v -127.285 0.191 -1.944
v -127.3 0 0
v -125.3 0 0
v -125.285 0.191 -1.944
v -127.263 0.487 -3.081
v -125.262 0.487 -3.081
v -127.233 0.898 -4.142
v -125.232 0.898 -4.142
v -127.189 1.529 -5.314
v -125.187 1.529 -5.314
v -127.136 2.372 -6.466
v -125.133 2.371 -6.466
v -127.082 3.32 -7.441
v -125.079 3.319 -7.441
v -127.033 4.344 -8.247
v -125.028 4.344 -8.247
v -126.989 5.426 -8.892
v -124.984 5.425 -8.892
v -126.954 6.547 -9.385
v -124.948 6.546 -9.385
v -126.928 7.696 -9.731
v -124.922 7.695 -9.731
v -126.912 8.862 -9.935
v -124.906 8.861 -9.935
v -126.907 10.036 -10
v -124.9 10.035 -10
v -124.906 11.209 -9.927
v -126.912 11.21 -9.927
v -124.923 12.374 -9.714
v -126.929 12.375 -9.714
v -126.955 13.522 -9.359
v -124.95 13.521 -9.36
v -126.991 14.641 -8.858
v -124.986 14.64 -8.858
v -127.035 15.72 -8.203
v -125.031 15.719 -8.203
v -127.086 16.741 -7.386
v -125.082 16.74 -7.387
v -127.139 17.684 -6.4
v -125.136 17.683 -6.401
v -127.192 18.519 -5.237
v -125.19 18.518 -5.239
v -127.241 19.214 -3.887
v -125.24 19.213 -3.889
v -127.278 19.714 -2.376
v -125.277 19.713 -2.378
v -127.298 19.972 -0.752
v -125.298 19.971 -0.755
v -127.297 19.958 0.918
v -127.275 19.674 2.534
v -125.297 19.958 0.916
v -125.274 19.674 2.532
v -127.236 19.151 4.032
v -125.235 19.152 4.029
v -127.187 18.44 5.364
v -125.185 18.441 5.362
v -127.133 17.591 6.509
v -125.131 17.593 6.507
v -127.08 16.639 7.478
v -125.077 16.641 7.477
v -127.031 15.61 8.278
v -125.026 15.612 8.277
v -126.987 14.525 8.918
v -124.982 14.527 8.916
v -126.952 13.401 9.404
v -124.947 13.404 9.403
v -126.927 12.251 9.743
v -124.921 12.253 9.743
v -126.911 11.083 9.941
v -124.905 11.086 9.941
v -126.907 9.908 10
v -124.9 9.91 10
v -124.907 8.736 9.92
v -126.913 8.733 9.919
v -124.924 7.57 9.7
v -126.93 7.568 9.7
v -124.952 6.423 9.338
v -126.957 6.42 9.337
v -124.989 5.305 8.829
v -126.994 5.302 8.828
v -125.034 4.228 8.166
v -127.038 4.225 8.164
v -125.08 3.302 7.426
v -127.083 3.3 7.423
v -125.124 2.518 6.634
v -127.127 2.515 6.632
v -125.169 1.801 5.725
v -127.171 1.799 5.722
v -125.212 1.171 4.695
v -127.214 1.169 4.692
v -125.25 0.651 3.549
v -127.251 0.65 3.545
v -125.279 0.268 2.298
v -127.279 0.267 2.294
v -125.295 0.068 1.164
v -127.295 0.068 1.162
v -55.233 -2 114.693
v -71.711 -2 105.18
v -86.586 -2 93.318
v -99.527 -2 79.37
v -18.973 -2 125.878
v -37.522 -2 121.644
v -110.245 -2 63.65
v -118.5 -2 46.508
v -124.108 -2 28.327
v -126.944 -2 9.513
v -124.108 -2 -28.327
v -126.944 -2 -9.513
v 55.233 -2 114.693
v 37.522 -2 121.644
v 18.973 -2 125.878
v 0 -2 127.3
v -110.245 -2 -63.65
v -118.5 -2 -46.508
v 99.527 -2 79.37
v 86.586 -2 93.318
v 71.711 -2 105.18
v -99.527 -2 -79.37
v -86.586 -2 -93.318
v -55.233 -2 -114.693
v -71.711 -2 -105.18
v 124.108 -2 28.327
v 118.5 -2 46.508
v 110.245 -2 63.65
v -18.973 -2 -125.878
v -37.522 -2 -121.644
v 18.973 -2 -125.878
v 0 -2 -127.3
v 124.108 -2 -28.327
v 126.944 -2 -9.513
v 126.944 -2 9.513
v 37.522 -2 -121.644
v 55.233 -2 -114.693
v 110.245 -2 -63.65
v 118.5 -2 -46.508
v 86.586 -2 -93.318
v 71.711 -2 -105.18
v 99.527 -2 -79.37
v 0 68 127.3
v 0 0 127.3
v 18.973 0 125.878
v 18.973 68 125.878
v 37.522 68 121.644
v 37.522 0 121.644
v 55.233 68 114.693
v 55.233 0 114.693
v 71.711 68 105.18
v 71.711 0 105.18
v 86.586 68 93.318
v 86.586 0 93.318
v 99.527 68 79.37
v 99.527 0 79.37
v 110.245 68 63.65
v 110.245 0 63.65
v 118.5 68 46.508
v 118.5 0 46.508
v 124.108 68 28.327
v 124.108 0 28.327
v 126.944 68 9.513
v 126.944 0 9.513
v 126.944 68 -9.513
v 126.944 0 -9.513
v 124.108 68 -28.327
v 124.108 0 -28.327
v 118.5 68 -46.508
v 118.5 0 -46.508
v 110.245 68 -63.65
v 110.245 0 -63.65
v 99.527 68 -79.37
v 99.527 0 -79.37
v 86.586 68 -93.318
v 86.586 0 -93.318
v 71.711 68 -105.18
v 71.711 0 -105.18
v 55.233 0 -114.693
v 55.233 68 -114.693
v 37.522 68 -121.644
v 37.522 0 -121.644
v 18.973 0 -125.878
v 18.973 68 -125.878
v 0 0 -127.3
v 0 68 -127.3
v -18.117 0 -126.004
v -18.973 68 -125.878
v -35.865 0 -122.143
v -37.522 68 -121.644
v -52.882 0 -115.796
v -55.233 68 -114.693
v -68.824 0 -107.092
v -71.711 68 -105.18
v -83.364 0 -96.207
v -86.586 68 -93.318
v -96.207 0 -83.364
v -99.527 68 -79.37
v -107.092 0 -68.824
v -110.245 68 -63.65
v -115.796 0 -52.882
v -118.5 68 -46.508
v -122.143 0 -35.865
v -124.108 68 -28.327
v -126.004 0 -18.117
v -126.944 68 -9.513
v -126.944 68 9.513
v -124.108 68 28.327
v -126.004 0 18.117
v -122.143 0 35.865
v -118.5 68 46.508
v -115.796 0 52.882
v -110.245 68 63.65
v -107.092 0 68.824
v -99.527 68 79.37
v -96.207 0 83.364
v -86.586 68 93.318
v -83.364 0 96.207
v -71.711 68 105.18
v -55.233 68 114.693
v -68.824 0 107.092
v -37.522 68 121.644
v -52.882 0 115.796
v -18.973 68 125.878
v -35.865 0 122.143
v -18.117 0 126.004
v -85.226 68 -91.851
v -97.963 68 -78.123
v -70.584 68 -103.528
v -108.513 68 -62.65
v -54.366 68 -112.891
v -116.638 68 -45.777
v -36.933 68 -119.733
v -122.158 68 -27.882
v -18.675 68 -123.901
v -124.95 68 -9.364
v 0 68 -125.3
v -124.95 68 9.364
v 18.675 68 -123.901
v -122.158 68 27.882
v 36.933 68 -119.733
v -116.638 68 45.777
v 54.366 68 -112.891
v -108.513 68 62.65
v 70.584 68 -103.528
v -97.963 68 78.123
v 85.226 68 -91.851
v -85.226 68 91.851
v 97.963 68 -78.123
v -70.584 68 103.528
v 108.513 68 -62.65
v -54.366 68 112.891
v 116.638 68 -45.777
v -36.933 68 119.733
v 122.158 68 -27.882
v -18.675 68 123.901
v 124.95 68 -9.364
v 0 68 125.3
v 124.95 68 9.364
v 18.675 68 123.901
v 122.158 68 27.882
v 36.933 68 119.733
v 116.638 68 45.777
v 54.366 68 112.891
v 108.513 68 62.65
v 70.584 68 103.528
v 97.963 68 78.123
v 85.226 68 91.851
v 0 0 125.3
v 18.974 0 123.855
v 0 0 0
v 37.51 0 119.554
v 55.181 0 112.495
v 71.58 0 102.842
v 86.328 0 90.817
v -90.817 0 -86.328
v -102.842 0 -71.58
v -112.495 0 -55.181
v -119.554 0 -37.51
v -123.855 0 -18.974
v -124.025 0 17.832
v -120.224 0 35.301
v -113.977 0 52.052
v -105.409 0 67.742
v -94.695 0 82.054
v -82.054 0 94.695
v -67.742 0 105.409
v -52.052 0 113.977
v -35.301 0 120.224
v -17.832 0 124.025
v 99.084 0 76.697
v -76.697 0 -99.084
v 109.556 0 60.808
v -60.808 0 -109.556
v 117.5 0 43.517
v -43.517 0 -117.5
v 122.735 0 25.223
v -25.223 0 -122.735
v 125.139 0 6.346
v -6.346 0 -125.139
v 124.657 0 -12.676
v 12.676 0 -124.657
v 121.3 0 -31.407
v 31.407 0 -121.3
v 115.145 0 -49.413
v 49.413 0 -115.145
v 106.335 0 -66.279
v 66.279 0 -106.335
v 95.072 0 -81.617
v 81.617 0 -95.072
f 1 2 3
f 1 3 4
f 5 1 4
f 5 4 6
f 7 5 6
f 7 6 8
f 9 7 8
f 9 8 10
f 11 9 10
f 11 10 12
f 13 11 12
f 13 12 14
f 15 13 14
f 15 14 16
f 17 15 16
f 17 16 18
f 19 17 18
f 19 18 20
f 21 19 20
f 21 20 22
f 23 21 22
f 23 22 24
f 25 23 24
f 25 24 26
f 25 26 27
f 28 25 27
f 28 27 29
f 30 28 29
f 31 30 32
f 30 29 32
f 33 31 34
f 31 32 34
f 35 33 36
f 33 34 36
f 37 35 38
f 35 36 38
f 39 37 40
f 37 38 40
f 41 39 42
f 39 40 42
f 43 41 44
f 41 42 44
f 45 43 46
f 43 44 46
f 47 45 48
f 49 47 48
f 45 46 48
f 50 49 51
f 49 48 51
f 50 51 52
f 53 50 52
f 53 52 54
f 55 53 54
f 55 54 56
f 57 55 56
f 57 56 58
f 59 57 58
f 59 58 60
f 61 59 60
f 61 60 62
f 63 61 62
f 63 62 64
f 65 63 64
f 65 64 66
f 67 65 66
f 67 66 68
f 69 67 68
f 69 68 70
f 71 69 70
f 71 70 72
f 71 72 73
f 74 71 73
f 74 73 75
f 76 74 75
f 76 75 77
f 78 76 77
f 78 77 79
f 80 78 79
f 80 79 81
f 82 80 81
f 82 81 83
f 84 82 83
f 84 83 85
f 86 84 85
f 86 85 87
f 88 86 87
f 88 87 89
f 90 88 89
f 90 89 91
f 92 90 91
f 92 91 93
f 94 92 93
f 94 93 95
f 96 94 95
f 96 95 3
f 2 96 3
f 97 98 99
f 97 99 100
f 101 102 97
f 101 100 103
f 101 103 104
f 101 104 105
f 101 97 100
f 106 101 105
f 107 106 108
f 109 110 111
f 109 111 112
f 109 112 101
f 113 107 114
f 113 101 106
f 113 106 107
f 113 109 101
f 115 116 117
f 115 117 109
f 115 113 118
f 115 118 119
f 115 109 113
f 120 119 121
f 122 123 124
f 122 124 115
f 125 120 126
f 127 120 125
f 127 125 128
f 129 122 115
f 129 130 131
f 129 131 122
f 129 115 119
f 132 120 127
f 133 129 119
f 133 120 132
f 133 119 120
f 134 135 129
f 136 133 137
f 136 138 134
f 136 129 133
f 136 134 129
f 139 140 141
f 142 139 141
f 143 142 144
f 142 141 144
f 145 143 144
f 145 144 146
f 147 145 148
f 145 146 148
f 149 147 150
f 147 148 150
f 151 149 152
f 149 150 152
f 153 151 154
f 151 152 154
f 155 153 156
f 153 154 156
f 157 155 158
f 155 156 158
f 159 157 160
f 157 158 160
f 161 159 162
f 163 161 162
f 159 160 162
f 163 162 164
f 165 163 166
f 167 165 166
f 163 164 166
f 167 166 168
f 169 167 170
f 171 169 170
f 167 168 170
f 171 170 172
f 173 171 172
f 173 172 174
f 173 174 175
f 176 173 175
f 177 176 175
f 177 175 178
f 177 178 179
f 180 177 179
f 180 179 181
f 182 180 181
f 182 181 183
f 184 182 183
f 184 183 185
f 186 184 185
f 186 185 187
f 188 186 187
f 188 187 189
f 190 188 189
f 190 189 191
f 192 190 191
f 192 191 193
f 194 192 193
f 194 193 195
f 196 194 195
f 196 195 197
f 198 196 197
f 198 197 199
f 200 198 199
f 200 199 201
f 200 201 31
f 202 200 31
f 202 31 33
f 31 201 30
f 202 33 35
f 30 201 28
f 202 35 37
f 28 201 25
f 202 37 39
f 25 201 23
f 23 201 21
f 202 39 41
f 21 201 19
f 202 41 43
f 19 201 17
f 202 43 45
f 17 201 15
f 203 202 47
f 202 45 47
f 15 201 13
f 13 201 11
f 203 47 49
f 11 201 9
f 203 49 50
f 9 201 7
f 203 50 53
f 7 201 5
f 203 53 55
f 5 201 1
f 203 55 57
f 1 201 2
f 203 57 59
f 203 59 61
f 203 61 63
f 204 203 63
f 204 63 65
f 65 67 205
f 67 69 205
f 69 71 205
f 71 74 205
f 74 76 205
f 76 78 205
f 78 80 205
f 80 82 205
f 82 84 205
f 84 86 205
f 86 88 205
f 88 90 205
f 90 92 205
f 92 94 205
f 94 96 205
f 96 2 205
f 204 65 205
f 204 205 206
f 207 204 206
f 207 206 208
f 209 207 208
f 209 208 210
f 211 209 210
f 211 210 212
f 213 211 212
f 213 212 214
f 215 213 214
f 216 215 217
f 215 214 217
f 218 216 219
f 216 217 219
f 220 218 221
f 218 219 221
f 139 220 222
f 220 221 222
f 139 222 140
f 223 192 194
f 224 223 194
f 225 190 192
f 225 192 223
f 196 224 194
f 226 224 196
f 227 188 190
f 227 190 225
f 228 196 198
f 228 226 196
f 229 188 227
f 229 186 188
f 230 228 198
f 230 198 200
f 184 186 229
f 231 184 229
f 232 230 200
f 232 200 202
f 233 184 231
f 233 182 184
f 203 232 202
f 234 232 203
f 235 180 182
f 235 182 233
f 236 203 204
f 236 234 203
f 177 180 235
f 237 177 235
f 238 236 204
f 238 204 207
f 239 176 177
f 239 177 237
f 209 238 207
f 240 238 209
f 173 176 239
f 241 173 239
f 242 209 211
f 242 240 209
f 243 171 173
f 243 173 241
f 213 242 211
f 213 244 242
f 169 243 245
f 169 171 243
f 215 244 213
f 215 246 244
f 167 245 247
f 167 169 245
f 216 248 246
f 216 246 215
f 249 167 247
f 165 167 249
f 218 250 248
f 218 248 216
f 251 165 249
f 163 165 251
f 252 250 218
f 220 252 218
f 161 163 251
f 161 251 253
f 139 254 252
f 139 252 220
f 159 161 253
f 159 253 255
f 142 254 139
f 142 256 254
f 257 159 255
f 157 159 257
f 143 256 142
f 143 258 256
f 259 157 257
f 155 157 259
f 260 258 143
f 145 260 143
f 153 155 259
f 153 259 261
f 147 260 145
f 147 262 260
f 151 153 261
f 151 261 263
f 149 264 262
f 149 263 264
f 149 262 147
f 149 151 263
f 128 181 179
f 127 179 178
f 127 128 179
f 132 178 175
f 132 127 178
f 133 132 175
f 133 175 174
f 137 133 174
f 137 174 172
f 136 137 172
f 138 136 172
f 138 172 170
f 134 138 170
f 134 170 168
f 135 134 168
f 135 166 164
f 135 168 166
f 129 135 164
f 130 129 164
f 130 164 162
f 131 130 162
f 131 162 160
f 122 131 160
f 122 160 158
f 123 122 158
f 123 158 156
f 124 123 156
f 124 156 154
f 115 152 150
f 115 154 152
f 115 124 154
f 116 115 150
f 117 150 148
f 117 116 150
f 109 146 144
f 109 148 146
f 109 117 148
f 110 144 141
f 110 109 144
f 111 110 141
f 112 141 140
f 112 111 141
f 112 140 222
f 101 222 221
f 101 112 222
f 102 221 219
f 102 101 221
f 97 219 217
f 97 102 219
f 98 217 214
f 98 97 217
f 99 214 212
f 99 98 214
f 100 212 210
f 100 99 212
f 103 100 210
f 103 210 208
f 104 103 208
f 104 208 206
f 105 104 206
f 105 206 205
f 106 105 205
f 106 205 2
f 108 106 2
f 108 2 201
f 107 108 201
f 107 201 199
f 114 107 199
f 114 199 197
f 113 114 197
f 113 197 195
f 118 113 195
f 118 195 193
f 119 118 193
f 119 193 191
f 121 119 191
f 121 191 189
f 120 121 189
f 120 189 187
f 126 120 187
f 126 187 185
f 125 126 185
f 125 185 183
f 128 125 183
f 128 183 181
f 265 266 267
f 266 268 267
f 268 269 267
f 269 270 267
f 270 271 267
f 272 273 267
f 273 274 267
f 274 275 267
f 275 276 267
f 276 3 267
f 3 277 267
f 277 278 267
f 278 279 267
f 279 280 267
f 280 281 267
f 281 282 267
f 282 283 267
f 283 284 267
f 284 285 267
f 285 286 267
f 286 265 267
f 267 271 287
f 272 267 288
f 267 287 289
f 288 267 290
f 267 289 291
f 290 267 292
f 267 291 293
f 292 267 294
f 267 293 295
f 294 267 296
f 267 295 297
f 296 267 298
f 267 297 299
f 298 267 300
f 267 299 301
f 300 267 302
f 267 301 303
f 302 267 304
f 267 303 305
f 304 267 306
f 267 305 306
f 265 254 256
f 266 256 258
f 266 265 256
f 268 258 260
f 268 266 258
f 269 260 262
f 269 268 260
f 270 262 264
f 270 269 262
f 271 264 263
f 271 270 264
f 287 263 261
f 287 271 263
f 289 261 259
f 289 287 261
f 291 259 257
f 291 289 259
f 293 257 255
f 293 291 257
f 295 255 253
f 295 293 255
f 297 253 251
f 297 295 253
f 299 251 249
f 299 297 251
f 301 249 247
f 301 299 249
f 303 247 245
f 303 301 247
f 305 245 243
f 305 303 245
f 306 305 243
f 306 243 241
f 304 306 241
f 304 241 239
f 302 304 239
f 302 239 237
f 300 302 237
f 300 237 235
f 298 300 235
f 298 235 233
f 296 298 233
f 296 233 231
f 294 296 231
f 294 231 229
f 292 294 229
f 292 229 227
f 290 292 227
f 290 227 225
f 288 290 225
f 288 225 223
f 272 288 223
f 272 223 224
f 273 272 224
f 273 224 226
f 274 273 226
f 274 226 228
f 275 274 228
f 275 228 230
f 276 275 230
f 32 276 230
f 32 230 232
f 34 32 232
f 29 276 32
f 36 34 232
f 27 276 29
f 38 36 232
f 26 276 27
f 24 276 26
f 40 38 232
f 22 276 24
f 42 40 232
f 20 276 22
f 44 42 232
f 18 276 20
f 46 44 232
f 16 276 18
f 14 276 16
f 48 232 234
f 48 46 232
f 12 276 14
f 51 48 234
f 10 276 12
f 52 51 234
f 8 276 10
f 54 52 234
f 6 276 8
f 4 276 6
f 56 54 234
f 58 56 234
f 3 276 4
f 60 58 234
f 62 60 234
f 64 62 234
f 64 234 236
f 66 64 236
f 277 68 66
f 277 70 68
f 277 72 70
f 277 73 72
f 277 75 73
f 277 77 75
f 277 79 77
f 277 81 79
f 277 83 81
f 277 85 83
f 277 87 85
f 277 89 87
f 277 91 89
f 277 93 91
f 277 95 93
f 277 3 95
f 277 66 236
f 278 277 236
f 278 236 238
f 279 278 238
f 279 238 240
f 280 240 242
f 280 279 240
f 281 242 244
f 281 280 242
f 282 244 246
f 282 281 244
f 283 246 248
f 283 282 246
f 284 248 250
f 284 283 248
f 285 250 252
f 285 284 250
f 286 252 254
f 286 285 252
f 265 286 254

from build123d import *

# Parameters (mm, degrees)
SKETCH1_R           = 127.3
SKETCH1_R_2         = 125.3
BOSS_EXTRUDE1_DEPTH = 68
BOSS_EXTRUDE2_START = 2
SKETCH4_R           = 127.3
BOSS_EXTRUDE2_DEPTH = 2
SKETCH3_R           = 10
CUT_EXTRUDE3_DEPTH  = 193.443706055


with BuildPart() as part:
    # Sketch1 → Boss-Extrude1 (new body)
    with BuildSketch(Plane(origin=(0, 0, 0), x_dir=(1, 0, 0), z_dir=(0, 1, 0))):
        with Locations(Location((0, 0, 0), (0, 0, 270))):
            Circle(SKETCH1_R)
        with Locations(Location((0, 0, 0), (0, 0, 270))):
            Circle(SKETCH1_R_2, mode=Mode.SUBTRACT)
    extrude(amount=BOSS_EXTRUDE1_DEPTH)

    # Sketch4 → Boss-Extrude2 (add)
    with BuildSketch(Plane.XZ.offset(BOSS_EXTRUDE2_START)):
        with Locations(Location((0, 0, 0), (0, 0, 270))):
            Circle(SKETCH4_R)
    extrude(amount=-BOSS_EXTRUDE2_DEPTH)

    # Sketch3 → Cut-Extrude3 (cut, through all)
    with BuildSketch(Plane(origin=(0, 0, 0), x_dir=(0, 0, -1), z_dir=(1, 0, 0))):
        with Locations(Location((0, 10, 0), (0, 0, 270))):
            Circle(SKETCH3_R)
    extrude(amount=-CUT_EXTRUDE3_DEPTH, mode=Mode.SUBTRACT)


solid = part.part
